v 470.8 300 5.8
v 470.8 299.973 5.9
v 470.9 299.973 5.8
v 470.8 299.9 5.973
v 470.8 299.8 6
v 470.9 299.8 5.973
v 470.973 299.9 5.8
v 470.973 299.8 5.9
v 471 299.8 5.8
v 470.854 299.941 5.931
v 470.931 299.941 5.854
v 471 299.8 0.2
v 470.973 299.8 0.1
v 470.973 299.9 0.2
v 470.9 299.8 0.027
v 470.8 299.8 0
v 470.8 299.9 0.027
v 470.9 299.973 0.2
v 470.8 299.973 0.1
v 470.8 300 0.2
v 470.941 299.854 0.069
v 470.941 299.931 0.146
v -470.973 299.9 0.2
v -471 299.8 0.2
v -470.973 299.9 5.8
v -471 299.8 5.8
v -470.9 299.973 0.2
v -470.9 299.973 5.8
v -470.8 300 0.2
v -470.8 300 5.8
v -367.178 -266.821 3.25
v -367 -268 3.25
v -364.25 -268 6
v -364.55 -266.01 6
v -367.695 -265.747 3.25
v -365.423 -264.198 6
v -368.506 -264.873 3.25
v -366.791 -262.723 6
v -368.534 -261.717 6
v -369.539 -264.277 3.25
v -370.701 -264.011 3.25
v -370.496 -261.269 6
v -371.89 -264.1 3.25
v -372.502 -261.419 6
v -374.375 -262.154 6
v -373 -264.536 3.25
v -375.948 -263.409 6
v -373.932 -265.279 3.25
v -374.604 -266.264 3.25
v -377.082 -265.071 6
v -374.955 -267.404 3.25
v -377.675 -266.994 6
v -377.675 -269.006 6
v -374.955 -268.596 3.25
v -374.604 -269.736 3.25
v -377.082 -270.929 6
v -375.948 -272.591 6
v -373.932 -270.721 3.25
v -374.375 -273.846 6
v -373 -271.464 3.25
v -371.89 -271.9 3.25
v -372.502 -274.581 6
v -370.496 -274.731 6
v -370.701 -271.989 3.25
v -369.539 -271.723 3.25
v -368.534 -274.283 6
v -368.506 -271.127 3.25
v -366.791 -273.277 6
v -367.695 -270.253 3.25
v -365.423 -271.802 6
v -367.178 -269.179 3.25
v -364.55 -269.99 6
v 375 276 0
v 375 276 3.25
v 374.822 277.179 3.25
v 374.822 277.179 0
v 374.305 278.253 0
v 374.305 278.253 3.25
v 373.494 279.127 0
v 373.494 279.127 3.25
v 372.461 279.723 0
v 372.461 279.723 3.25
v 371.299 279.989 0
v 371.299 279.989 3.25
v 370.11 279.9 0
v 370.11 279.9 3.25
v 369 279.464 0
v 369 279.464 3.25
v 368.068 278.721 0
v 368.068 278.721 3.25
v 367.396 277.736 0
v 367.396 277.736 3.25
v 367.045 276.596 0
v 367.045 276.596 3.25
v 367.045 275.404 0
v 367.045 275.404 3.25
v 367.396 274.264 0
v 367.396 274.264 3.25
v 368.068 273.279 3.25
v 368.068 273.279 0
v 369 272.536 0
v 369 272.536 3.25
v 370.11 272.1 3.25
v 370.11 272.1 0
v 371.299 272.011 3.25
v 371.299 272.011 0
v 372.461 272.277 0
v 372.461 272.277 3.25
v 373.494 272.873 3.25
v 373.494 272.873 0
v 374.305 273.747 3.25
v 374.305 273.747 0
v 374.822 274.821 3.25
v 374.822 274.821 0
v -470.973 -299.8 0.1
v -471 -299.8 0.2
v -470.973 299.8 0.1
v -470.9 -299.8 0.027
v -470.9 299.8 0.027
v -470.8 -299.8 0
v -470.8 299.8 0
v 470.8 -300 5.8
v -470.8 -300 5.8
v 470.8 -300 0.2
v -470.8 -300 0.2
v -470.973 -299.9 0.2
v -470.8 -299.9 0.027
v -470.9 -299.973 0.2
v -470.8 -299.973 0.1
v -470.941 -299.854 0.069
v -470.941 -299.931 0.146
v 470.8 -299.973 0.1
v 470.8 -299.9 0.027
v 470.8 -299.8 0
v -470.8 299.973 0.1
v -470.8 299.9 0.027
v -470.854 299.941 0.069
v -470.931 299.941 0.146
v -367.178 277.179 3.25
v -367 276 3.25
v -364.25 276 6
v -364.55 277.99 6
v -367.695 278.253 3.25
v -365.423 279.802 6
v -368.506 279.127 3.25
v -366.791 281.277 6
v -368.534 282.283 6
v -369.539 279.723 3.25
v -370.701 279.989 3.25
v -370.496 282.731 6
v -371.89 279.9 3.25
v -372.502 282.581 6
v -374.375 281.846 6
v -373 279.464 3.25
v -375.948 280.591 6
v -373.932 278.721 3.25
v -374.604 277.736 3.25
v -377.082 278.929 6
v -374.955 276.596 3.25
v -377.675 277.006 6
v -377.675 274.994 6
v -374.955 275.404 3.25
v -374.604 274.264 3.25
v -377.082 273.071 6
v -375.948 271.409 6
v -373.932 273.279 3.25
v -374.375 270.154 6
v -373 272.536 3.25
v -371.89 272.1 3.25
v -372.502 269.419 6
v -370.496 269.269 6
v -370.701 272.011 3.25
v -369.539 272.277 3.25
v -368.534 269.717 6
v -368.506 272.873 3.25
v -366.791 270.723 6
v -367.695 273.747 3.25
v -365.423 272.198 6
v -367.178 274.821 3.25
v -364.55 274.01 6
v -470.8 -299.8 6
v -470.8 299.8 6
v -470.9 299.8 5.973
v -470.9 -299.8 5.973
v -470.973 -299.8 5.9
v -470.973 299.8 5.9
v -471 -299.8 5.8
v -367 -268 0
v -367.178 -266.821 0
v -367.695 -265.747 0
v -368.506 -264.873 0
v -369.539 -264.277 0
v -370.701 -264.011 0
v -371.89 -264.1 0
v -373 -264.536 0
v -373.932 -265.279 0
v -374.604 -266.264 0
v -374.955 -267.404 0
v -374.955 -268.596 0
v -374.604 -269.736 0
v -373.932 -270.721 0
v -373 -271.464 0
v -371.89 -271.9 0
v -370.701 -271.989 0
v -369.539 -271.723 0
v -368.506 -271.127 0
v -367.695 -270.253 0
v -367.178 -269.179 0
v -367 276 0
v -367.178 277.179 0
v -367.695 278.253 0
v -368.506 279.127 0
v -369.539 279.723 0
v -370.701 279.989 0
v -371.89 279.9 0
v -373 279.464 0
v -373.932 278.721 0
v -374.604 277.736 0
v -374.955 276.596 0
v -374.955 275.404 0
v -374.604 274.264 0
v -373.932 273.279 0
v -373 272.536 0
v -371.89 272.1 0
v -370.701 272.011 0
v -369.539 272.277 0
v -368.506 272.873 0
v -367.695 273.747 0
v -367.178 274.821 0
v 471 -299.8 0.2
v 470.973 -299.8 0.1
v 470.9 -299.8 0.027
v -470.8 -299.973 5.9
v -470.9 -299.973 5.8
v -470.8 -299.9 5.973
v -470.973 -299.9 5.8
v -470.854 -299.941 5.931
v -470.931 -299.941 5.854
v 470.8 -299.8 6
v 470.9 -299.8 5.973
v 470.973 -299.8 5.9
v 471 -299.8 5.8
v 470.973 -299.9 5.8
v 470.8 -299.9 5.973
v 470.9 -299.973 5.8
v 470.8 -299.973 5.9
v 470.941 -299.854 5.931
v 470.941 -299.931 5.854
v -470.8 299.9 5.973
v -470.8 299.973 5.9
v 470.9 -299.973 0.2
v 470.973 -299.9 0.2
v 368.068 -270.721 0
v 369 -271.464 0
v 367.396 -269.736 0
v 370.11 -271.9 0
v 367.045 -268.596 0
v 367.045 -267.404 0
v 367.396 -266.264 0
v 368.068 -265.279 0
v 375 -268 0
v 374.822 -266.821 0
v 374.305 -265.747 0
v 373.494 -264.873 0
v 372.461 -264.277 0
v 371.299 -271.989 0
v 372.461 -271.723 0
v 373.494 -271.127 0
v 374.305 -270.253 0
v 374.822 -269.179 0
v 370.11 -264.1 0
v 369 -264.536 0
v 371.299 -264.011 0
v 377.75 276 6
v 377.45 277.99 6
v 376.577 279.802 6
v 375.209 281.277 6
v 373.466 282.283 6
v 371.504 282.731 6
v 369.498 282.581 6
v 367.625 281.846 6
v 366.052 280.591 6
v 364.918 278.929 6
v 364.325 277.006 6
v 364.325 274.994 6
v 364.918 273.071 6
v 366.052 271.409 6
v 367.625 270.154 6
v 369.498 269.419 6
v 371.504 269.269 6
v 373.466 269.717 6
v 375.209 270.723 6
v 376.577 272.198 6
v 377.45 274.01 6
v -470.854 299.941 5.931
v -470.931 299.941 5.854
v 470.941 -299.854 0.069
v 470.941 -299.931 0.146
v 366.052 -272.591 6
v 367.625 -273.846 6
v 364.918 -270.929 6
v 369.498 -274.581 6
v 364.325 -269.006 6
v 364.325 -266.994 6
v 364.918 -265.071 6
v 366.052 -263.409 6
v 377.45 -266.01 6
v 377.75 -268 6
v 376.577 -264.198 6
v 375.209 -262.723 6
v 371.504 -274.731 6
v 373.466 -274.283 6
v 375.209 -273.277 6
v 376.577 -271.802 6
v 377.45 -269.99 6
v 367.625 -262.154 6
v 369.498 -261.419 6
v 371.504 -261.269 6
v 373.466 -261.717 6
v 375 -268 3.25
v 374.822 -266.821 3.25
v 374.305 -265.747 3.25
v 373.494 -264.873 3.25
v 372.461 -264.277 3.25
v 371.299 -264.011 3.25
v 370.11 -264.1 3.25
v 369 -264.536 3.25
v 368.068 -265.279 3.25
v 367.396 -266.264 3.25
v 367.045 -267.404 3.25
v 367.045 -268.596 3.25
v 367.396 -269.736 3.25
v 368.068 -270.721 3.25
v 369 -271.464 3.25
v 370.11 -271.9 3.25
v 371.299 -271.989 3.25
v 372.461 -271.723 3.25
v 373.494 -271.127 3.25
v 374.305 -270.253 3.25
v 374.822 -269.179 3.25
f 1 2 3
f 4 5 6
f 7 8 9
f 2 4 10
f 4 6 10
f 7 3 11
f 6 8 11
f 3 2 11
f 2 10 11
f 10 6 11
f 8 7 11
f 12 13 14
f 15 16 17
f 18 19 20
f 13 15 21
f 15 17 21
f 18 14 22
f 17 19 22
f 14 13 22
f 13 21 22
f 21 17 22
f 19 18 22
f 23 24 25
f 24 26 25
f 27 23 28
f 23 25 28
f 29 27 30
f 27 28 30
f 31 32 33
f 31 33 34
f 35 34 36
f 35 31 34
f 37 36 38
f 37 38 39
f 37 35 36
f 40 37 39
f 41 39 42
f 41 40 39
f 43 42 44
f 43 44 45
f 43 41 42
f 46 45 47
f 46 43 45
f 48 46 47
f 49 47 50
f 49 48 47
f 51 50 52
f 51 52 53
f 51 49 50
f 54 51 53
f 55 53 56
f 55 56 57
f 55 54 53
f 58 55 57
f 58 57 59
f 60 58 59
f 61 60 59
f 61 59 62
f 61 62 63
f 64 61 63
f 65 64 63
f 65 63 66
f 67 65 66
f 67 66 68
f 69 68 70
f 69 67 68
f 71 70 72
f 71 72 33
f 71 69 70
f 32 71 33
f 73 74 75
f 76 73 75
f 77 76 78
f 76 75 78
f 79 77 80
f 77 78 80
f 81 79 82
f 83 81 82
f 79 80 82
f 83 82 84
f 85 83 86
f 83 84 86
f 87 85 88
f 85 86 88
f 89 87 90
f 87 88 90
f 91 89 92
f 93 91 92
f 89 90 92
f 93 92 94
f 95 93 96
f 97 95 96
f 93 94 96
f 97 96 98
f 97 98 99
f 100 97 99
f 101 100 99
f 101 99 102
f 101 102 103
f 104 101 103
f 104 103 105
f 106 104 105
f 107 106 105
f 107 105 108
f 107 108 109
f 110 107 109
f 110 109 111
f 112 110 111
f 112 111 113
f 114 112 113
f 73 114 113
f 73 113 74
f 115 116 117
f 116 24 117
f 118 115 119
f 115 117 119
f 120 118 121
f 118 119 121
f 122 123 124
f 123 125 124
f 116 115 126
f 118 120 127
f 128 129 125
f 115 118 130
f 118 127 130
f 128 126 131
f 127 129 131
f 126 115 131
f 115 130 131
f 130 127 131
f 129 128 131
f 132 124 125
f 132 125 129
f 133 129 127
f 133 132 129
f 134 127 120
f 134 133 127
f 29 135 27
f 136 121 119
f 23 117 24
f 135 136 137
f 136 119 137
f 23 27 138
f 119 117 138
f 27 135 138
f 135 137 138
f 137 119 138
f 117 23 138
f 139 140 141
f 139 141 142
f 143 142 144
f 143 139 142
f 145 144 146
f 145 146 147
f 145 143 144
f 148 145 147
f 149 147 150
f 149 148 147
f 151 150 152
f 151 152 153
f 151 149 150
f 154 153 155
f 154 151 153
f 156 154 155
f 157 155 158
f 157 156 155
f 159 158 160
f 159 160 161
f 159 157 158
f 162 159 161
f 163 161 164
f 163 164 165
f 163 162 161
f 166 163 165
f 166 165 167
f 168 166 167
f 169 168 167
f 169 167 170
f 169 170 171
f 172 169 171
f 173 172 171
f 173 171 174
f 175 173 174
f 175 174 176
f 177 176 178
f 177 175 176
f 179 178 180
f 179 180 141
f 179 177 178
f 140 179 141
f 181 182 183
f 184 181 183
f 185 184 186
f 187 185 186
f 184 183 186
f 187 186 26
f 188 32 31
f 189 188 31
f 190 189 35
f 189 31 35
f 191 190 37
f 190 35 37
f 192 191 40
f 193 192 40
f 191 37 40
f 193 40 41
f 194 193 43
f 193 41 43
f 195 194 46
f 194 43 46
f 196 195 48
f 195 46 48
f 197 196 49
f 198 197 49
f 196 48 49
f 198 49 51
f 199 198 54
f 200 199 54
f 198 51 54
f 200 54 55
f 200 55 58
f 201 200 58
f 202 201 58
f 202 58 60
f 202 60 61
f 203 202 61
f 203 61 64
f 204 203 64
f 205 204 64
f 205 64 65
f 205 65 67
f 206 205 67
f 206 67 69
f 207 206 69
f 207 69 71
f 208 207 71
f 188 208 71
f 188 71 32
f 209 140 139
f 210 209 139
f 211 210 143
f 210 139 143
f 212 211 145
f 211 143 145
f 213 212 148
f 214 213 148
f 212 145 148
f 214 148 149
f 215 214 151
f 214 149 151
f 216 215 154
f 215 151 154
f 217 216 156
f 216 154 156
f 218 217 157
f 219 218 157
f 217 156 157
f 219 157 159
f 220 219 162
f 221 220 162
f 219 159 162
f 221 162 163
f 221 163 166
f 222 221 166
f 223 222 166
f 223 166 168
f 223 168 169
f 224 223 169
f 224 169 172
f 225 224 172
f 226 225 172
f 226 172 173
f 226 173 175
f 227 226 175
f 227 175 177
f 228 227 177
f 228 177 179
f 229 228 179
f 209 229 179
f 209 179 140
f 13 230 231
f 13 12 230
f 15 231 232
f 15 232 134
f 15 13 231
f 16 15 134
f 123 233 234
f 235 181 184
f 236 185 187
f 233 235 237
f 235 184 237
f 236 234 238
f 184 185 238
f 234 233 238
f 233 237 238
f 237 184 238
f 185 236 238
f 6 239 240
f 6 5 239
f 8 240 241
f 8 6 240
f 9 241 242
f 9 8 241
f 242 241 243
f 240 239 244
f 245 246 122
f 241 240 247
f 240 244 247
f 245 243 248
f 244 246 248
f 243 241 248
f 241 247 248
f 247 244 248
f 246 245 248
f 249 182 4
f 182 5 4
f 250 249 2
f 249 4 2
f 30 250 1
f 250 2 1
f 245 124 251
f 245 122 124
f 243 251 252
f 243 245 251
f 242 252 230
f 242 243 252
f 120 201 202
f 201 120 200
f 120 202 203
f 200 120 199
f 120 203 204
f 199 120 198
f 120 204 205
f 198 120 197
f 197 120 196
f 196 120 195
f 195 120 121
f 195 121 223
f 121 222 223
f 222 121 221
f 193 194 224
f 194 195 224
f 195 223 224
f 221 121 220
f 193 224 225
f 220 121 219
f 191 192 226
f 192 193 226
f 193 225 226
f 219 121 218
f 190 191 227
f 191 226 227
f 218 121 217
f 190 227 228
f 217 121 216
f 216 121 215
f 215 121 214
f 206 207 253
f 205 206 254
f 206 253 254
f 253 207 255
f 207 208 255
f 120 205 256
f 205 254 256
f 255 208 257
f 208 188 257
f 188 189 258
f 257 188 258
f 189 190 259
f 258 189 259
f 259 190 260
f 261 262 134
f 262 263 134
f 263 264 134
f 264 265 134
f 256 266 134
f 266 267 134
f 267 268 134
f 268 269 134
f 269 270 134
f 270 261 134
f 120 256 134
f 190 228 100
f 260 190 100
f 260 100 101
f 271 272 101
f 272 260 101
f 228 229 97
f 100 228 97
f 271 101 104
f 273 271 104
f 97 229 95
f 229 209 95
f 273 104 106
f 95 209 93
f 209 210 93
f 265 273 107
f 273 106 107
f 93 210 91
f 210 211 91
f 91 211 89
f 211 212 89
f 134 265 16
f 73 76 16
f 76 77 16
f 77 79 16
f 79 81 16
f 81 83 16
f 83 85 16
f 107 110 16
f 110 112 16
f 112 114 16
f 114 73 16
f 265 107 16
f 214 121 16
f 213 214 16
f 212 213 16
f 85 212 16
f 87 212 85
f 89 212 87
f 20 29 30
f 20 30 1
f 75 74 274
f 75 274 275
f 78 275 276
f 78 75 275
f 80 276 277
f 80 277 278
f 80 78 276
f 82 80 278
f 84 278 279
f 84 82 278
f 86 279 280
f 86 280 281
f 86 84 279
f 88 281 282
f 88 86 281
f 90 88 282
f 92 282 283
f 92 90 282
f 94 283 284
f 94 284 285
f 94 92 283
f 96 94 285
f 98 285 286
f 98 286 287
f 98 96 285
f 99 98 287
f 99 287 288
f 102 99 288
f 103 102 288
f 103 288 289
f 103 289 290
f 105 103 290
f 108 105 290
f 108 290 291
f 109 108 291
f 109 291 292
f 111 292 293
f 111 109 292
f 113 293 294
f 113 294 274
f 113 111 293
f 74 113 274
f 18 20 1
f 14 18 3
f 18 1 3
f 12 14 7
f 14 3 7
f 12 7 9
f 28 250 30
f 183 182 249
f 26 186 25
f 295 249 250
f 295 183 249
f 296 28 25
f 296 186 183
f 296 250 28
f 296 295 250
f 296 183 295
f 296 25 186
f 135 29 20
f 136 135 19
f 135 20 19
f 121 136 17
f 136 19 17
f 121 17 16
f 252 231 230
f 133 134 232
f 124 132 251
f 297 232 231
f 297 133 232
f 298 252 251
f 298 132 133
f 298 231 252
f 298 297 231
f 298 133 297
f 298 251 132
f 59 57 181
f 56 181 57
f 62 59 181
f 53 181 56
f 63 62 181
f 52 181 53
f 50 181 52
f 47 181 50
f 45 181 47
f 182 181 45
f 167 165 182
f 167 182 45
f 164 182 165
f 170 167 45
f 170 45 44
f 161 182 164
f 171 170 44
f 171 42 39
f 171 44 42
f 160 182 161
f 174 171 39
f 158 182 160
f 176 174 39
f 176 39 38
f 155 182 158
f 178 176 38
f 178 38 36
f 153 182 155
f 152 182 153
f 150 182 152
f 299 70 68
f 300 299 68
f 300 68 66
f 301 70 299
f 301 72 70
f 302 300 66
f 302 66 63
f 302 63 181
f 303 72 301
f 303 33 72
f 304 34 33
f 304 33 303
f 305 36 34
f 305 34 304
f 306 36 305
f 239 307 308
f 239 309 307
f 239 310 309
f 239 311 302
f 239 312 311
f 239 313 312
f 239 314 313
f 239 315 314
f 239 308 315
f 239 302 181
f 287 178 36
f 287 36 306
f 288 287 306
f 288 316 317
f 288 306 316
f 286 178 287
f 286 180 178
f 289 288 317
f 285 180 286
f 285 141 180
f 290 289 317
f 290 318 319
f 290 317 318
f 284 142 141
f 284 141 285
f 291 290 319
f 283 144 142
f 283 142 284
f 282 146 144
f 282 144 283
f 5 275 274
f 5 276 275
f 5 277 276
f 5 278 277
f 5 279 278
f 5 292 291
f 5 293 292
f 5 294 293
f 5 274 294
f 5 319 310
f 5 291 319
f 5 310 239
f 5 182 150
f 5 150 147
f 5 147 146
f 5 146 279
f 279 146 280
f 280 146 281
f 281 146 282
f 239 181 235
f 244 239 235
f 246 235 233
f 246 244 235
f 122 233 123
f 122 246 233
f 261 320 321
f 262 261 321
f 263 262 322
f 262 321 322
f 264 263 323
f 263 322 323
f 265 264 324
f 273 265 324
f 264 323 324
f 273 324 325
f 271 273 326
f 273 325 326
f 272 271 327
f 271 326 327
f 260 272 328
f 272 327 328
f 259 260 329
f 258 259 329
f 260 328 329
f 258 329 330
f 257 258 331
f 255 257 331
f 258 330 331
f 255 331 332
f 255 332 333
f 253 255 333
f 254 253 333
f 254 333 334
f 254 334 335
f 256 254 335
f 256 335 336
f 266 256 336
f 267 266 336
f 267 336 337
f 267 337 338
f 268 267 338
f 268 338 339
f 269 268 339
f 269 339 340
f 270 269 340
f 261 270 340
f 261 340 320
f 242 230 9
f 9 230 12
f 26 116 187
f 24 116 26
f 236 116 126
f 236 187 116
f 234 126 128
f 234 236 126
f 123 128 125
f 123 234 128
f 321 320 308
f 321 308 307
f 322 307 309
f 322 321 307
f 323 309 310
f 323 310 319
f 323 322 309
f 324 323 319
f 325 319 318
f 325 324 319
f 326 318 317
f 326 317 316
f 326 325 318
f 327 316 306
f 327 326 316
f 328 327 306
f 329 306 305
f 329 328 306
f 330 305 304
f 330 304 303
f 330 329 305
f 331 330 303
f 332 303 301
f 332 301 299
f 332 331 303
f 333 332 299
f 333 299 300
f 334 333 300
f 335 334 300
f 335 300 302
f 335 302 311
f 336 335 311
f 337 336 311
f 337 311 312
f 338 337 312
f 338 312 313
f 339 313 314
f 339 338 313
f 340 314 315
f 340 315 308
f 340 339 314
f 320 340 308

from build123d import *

# Parameters (mm, degrees)
SKETCH1_W           = 942
SKETCH1_H           = 600
BOSS_EXTRUDE1_DEPTH = 6
SKETCH2_R           = 4
CUT_EXTRUDE1_DEPTH  = 7
CHAMFER1_SIZE       = 2.75
FILLET1_R           = 0.2


with BuildPart() as part:
    # Sketch1 → Boss-Extrude1 (new body)
    with BuildSketch(Plane.XY):
        Rectangle(SKETCH1_W, SKETCH1_H)
    extrude(amount=BOSS_EXTRUDE1_DEPTH)

    # Sketch2 → Cut-Extrude1 (cut, through all)
    with BuildSketch(Plane.XY.offset(6)):
        with Locations((-371, 276)):
            Circle(SKETCH2_R)
        with Locations((371, 276)):
            Circle(SKETCH2_R)
        with Locations((371, -268)):
            Circle(SKETCH2_R)
        with Locations((-371, -268)):
            Circle(SKETCH2_R)
    extrude(amount=-CUT_EXTRUDE1_DEPTH, mode=Mode.SUBTRACT)

    # Chamfer1
    chamfer1_edges = [part.edges().sort_by_distance(p)[0] for p in [
        (-375, 276, 6),
        (367, 276, 6),
        (367, -268, 6),
        (-375, -268, 6),
    ]]
    chamfer(chamfer1_edges, length=CHAMFER1_SIZE)

    # Fillet1
    fillet1_edges = [part.edges().sort_by_distance(p)[0] for p in [
        (-471, 0, 6),
        (0, -300, 6),
        (471, 0, 6),
        (0, -300, 0),
        (-471, 0, 0),
        (0, 300, 0),
        (471, 0, 0),
        (0, 300, 6),
        (471, -300, 3),
        (-471, -300, 3),
        (-471, 300, 3),
        (471, 300, 3),
    ]]
    fillet(fillet1_edges, radius=FILLET1_R)


solid = part.part
